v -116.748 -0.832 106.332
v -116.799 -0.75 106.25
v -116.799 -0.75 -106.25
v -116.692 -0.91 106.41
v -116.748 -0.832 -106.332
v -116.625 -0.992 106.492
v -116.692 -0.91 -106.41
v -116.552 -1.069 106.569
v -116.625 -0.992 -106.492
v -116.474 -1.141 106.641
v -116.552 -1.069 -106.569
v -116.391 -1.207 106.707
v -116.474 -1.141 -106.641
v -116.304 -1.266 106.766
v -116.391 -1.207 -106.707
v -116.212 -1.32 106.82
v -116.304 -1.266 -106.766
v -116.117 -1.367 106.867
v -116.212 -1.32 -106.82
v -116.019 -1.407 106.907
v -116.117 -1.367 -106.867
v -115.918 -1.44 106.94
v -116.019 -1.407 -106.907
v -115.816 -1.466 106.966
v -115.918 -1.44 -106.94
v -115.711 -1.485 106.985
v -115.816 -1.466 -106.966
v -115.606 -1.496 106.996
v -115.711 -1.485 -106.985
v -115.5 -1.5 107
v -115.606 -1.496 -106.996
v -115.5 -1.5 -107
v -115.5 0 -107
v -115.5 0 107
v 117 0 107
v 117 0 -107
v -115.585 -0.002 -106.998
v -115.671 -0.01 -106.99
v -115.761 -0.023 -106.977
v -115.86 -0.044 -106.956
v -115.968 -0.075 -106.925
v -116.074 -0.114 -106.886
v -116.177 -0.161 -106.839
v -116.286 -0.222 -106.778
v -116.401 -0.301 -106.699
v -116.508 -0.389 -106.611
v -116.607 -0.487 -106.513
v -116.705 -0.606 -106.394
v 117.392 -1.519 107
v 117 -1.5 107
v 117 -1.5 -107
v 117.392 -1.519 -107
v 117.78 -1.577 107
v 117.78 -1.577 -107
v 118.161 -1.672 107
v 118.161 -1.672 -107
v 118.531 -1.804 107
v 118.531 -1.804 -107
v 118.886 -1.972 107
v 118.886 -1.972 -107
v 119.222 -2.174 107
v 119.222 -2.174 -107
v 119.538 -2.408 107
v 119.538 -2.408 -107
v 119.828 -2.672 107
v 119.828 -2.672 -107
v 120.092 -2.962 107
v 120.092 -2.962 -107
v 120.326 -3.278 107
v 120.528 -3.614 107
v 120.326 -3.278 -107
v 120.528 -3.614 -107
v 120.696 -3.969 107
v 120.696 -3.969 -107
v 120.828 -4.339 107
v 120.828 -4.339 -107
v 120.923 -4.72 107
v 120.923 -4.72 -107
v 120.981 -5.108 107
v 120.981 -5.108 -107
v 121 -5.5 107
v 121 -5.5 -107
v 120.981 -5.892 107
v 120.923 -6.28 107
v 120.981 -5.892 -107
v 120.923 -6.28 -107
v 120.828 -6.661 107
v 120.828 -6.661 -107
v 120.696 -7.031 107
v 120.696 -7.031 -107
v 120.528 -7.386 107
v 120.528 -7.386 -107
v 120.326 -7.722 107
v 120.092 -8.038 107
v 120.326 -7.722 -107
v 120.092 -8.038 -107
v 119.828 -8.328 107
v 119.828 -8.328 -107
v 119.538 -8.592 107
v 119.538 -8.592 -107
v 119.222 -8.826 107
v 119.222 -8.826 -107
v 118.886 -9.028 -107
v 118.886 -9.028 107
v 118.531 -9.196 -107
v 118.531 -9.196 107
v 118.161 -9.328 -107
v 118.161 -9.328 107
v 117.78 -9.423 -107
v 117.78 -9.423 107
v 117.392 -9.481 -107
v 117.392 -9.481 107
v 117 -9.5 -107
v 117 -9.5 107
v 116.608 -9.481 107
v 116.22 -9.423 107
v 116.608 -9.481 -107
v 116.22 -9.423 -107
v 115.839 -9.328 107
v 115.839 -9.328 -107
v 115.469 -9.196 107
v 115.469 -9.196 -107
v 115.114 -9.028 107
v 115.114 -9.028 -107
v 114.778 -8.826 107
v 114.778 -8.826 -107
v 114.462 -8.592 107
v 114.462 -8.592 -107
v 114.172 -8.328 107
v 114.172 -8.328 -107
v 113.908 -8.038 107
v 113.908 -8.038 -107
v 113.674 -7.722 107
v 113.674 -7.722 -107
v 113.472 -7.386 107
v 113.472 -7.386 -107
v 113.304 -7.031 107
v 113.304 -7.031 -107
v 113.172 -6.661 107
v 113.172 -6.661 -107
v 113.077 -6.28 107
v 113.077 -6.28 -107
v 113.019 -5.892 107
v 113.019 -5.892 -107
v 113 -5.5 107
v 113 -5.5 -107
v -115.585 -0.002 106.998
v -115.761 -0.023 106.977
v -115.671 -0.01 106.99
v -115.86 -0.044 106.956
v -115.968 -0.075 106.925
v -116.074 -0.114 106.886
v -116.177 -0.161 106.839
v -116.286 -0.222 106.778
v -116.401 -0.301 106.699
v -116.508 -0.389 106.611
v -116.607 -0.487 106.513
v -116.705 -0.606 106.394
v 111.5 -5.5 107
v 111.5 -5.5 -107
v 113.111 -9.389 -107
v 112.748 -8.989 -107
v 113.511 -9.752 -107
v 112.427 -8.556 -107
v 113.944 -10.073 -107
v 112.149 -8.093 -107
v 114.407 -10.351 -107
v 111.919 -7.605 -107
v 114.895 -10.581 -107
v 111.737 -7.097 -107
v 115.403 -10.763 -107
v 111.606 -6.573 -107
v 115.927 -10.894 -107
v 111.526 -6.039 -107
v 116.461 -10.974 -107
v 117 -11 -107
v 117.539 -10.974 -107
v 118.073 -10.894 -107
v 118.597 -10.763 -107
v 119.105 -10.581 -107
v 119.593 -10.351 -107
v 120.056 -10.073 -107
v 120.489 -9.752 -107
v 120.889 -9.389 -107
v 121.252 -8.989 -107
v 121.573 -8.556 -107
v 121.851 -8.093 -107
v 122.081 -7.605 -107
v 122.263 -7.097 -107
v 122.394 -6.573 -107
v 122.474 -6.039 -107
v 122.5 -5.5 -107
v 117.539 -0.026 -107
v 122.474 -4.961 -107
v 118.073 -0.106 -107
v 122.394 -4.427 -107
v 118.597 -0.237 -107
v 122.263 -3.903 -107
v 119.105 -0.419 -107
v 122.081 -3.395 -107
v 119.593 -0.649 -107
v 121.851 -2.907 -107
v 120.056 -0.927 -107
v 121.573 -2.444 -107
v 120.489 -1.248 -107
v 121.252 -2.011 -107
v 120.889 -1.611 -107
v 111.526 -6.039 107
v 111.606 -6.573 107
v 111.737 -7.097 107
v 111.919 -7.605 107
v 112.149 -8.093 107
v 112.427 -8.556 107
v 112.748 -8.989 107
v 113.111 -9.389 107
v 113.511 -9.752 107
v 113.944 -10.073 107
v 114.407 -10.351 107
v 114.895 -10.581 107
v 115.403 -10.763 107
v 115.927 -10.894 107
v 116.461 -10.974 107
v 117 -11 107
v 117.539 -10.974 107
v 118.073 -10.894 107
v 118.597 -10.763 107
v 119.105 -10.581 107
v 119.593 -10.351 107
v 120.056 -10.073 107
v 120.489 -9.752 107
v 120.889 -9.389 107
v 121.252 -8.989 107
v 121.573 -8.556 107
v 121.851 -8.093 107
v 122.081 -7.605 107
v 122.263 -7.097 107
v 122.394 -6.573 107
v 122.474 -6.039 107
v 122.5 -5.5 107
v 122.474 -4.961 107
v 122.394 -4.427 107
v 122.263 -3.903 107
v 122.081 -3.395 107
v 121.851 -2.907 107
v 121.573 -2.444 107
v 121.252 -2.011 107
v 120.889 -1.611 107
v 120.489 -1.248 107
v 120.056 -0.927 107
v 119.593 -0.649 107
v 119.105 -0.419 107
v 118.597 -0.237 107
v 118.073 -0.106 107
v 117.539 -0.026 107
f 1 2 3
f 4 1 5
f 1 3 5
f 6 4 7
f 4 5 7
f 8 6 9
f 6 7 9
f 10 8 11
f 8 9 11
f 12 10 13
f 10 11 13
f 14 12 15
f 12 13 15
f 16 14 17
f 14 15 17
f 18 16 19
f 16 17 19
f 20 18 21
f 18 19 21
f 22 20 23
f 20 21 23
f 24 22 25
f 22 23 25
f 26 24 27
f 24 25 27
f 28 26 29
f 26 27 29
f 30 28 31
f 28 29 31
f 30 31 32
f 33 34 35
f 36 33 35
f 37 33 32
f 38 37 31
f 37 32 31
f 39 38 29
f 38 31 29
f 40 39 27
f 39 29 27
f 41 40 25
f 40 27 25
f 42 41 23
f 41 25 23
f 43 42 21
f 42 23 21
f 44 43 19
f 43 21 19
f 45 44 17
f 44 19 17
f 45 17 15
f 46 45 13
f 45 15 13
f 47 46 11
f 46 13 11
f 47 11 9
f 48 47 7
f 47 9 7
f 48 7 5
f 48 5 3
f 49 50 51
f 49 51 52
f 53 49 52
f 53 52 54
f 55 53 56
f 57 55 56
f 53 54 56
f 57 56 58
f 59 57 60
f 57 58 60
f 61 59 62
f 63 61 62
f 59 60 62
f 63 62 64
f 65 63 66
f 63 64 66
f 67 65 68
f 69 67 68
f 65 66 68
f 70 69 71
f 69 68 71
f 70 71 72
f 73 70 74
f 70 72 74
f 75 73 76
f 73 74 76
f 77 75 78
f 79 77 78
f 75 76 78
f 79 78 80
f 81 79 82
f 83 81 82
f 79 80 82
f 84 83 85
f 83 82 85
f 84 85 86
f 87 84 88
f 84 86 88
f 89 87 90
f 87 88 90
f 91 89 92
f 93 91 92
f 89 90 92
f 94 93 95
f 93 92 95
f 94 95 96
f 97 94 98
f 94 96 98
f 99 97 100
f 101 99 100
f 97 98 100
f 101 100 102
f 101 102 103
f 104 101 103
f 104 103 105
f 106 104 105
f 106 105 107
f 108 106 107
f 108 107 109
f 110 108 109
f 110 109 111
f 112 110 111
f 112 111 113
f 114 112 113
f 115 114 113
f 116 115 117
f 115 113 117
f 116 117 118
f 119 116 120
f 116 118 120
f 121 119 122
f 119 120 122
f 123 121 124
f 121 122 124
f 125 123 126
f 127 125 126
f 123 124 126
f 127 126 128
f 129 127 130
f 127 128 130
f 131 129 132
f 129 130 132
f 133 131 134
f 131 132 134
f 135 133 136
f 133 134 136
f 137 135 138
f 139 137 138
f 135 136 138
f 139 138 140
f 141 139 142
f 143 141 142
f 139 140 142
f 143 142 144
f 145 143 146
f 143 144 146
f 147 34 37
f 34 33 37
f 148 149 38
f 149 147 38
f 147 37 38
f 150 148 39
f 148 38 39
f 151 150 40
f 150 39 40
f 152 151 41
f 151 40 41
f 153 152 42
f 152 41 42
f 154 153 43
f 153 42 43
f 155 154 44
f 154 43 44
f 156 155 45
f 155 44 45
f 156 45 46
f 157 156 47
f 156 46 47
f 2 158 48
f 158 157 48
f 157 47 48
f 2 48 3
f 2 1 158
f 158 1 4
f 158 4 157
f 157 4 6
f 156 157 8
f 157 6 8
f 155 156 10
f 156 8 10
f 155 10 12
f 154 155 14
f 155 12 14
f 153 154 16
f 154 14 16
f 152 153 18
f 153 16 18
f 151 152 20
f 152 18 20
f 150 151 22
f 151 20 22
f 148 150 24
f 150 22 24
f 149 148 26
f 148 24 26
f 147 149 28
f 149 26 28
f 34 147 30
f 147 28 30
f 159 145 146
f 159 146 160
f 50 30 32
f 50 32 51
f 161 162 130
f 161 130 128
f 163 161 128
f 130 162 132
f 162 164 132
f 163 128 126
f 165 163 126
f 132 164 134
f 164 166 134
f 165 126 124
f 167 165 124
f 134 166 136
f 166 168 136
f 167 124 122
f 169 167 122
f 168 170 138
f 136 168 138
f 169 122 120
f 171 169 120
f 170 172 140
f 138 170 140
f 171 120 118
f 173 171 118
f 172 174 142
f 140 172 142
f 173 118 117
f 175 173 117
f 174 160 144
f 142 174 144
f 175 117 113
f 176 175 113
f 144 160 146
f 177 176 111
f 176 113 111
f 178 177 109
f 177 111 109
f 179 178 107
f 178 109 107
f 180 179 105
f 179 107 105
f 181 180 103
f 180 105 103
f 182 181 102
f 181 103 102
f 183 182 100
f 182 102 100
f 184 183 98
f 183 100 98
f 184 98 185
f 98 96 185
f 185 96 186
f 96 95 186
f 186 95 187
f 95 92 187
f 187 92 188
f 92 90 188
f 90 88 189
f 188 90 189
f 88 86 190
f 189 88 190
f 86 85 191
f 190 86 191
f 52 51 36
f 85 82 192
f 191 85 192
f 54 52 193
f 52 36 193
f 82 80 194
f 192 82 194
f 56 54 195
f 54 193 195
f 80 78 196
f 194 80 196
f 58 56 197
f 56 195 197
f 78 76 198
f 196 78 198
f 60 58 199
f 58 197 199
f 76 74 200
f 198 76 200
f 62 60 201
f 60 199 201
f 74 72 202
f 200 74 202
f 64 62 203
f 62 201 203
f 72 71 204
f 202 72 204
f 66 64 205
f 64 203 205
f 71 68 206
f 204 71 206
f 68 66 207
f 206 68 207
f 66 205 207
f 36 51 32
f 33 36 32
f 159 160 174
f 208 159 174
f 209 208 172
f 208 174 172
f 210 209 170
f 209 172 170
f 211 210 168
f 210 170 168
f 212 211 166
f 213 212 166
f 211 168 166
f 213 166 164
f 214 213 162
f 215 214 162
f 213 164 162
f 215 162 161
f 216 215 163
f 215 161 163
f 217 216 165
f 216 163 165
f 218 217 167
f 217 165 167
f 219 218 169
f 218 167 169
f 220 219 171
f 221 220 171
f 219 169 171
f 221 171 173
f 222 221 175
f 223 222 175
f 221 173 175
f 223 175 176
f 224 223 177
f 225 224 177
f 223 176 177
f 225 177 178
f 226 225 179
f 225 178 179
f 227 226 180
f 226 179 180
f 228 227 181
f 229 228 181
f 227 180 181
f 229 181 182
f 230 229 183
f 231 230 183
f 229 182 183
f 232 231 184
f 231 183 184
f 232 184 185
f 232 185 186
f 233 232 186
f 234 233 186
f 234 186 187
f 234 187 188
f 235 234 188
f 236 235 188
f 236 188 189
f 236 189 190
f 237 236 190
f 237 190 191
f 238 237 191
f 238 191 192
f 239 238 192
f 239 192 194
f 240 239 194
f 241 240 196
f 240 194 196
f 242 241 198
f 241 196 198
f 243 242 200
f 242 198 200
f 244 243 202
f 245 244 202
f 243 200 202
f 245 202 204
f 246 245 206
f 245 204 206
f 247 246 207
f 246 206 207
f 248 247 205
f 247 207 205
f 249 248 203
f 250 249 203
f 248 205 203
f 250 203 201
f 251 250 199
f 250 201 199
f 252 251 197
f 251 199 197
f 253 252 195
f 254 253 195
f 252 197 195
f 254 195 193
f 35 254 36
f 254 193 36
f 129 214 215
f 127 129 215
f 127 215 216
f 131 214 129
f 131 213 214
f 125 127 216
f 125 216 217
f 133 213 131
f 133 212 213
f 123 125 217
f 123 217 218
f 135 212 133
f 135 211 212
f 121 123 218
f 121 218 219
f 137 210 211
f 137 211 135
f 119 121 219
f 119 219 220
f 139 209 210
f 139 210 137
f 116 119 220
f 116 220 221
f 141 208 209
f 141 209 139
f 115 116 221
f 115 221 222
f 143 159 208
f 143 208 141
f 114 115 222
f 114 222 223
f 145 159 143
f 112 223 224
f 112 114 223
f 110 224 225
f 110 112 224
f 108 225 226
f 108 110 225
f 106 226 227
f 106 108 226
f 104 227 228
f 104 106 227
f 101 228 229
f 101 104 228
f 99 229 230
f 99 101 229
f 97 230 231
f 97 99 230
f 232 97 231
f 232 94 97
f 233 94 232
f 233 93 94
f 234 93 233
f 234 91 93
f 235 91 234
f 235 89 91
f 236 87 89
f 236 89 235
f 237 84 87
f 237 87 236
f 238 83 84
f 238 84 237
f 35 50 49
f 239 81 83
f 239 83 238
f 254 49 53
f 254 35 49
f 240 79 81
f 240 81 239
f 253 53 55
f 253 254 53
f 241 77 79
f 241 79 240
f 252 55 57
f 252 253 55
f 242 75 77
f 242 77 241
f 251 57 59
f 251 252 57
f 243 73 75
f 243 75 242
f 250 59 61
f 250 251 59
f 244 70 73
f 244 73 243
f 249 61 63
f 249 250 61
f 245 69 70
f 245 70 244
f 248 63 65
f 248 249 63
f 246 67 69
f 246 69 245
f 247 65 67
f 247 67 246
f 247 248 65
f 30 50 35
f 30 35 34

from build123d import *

# Parameters (mm, degrees)
SKETCH_1_W             = 234
SKETCH_1_H             = 214
SM_BASE_FLANGE_1_DEPTH = 1.5
OTHER_START            = -107
OTHER_1_DEPTH          = 214
FILLET_3_R             = 1.5


# Read off the part's stored shape, not the designer's step: Каемка1
# Sheet-metal steps are written as plain solids
with BuildPart() as part:
    # Sketch 1 → Базовая кромка1 (new body)
    with BuildSketch(Plane.XZ.offset(1.5)):
        Rectangle(SKETCH_1_W, SKETCH_1_H)
    extrude(amount=-SM_BASE_FLANGE_1_DEPTH)

    # Other 1 outline → Other 1 (add)
    with BuildSketch(Plane.XY.offset(OTHER_START)):
        with BuildLine():
            Line((113, -5.5), (111.5, -5.5))
            ThreePointArc((111.5, -5.5), (120.889087297, -9.389087297), (117, 0))
            Line((117, 0), (117, -1.5))
            ThreePointArc((117, -1.5), (119.828427125, -8.328427125), (113, -5.5))
        make_face()
    extrude(amount=OTHER_1_DEPTH)

    # Скругление3
    # the kernel refuses this fillet: 1.5 mm, written as the material it takes off along each edge
    with BuildSketch(Plane(origin=(-117, 0, -110.75), x_dir=(0, -1, 0), z_dir=(0, 0, 1))) as fillet_3_piece_1:
        with BuildLine():
            CenterArc((FILLET_3_R, FILLET_3_R), FILLET_3_R, 180, 90)
            Line((0, FILLET_3_R), (0, 0))
            Line((0, 0), (FILLET_3_R, 0))
        make_face()
    extrude(amount=221.5, mode=Mode.SUBTRACT)
    with BuildSketch(Plane(origin=(-117, -1.5, -110.75), x_dir=(0, 1, 0), z_dir=(0, 0, 1))) as fillet_3_piece_2:
        with BuildLine():
            CenterArc((FILLET_3_R, -FILLET_3_R), FILLET_3_R, 90, 90)
            Line((0, -FILLET_3_R), (0, 0))
            Line((0, 0), (FILLET_3_R, 0))
        make_face()
    extrude(amount=221.5, mode=Mode.SUBTRACT)
    with BuildSketch(Plane(origin=(-117, -5.25, -107), x_dir=(0, 0, 1), z_dir=(0, 1, 0)), Plane(origin=(-117, -5.25, 107), x_dir=(1, 0, 0), z_dir=(0, 1, 0))) as fillet_3_piece_3:
        with BuildLine():
            CenterArc((FILLET_3_R, FILLET_3_R), FILLET_3_R, 180, 90)
            Line((0, FILLET_3_R), (0, 0))
            Line((0, 0), (FILLET_3_R, 0))
        make_face()
    extrude(amount=9, mode=Mode.SUBTRACT)


solid = part.part
